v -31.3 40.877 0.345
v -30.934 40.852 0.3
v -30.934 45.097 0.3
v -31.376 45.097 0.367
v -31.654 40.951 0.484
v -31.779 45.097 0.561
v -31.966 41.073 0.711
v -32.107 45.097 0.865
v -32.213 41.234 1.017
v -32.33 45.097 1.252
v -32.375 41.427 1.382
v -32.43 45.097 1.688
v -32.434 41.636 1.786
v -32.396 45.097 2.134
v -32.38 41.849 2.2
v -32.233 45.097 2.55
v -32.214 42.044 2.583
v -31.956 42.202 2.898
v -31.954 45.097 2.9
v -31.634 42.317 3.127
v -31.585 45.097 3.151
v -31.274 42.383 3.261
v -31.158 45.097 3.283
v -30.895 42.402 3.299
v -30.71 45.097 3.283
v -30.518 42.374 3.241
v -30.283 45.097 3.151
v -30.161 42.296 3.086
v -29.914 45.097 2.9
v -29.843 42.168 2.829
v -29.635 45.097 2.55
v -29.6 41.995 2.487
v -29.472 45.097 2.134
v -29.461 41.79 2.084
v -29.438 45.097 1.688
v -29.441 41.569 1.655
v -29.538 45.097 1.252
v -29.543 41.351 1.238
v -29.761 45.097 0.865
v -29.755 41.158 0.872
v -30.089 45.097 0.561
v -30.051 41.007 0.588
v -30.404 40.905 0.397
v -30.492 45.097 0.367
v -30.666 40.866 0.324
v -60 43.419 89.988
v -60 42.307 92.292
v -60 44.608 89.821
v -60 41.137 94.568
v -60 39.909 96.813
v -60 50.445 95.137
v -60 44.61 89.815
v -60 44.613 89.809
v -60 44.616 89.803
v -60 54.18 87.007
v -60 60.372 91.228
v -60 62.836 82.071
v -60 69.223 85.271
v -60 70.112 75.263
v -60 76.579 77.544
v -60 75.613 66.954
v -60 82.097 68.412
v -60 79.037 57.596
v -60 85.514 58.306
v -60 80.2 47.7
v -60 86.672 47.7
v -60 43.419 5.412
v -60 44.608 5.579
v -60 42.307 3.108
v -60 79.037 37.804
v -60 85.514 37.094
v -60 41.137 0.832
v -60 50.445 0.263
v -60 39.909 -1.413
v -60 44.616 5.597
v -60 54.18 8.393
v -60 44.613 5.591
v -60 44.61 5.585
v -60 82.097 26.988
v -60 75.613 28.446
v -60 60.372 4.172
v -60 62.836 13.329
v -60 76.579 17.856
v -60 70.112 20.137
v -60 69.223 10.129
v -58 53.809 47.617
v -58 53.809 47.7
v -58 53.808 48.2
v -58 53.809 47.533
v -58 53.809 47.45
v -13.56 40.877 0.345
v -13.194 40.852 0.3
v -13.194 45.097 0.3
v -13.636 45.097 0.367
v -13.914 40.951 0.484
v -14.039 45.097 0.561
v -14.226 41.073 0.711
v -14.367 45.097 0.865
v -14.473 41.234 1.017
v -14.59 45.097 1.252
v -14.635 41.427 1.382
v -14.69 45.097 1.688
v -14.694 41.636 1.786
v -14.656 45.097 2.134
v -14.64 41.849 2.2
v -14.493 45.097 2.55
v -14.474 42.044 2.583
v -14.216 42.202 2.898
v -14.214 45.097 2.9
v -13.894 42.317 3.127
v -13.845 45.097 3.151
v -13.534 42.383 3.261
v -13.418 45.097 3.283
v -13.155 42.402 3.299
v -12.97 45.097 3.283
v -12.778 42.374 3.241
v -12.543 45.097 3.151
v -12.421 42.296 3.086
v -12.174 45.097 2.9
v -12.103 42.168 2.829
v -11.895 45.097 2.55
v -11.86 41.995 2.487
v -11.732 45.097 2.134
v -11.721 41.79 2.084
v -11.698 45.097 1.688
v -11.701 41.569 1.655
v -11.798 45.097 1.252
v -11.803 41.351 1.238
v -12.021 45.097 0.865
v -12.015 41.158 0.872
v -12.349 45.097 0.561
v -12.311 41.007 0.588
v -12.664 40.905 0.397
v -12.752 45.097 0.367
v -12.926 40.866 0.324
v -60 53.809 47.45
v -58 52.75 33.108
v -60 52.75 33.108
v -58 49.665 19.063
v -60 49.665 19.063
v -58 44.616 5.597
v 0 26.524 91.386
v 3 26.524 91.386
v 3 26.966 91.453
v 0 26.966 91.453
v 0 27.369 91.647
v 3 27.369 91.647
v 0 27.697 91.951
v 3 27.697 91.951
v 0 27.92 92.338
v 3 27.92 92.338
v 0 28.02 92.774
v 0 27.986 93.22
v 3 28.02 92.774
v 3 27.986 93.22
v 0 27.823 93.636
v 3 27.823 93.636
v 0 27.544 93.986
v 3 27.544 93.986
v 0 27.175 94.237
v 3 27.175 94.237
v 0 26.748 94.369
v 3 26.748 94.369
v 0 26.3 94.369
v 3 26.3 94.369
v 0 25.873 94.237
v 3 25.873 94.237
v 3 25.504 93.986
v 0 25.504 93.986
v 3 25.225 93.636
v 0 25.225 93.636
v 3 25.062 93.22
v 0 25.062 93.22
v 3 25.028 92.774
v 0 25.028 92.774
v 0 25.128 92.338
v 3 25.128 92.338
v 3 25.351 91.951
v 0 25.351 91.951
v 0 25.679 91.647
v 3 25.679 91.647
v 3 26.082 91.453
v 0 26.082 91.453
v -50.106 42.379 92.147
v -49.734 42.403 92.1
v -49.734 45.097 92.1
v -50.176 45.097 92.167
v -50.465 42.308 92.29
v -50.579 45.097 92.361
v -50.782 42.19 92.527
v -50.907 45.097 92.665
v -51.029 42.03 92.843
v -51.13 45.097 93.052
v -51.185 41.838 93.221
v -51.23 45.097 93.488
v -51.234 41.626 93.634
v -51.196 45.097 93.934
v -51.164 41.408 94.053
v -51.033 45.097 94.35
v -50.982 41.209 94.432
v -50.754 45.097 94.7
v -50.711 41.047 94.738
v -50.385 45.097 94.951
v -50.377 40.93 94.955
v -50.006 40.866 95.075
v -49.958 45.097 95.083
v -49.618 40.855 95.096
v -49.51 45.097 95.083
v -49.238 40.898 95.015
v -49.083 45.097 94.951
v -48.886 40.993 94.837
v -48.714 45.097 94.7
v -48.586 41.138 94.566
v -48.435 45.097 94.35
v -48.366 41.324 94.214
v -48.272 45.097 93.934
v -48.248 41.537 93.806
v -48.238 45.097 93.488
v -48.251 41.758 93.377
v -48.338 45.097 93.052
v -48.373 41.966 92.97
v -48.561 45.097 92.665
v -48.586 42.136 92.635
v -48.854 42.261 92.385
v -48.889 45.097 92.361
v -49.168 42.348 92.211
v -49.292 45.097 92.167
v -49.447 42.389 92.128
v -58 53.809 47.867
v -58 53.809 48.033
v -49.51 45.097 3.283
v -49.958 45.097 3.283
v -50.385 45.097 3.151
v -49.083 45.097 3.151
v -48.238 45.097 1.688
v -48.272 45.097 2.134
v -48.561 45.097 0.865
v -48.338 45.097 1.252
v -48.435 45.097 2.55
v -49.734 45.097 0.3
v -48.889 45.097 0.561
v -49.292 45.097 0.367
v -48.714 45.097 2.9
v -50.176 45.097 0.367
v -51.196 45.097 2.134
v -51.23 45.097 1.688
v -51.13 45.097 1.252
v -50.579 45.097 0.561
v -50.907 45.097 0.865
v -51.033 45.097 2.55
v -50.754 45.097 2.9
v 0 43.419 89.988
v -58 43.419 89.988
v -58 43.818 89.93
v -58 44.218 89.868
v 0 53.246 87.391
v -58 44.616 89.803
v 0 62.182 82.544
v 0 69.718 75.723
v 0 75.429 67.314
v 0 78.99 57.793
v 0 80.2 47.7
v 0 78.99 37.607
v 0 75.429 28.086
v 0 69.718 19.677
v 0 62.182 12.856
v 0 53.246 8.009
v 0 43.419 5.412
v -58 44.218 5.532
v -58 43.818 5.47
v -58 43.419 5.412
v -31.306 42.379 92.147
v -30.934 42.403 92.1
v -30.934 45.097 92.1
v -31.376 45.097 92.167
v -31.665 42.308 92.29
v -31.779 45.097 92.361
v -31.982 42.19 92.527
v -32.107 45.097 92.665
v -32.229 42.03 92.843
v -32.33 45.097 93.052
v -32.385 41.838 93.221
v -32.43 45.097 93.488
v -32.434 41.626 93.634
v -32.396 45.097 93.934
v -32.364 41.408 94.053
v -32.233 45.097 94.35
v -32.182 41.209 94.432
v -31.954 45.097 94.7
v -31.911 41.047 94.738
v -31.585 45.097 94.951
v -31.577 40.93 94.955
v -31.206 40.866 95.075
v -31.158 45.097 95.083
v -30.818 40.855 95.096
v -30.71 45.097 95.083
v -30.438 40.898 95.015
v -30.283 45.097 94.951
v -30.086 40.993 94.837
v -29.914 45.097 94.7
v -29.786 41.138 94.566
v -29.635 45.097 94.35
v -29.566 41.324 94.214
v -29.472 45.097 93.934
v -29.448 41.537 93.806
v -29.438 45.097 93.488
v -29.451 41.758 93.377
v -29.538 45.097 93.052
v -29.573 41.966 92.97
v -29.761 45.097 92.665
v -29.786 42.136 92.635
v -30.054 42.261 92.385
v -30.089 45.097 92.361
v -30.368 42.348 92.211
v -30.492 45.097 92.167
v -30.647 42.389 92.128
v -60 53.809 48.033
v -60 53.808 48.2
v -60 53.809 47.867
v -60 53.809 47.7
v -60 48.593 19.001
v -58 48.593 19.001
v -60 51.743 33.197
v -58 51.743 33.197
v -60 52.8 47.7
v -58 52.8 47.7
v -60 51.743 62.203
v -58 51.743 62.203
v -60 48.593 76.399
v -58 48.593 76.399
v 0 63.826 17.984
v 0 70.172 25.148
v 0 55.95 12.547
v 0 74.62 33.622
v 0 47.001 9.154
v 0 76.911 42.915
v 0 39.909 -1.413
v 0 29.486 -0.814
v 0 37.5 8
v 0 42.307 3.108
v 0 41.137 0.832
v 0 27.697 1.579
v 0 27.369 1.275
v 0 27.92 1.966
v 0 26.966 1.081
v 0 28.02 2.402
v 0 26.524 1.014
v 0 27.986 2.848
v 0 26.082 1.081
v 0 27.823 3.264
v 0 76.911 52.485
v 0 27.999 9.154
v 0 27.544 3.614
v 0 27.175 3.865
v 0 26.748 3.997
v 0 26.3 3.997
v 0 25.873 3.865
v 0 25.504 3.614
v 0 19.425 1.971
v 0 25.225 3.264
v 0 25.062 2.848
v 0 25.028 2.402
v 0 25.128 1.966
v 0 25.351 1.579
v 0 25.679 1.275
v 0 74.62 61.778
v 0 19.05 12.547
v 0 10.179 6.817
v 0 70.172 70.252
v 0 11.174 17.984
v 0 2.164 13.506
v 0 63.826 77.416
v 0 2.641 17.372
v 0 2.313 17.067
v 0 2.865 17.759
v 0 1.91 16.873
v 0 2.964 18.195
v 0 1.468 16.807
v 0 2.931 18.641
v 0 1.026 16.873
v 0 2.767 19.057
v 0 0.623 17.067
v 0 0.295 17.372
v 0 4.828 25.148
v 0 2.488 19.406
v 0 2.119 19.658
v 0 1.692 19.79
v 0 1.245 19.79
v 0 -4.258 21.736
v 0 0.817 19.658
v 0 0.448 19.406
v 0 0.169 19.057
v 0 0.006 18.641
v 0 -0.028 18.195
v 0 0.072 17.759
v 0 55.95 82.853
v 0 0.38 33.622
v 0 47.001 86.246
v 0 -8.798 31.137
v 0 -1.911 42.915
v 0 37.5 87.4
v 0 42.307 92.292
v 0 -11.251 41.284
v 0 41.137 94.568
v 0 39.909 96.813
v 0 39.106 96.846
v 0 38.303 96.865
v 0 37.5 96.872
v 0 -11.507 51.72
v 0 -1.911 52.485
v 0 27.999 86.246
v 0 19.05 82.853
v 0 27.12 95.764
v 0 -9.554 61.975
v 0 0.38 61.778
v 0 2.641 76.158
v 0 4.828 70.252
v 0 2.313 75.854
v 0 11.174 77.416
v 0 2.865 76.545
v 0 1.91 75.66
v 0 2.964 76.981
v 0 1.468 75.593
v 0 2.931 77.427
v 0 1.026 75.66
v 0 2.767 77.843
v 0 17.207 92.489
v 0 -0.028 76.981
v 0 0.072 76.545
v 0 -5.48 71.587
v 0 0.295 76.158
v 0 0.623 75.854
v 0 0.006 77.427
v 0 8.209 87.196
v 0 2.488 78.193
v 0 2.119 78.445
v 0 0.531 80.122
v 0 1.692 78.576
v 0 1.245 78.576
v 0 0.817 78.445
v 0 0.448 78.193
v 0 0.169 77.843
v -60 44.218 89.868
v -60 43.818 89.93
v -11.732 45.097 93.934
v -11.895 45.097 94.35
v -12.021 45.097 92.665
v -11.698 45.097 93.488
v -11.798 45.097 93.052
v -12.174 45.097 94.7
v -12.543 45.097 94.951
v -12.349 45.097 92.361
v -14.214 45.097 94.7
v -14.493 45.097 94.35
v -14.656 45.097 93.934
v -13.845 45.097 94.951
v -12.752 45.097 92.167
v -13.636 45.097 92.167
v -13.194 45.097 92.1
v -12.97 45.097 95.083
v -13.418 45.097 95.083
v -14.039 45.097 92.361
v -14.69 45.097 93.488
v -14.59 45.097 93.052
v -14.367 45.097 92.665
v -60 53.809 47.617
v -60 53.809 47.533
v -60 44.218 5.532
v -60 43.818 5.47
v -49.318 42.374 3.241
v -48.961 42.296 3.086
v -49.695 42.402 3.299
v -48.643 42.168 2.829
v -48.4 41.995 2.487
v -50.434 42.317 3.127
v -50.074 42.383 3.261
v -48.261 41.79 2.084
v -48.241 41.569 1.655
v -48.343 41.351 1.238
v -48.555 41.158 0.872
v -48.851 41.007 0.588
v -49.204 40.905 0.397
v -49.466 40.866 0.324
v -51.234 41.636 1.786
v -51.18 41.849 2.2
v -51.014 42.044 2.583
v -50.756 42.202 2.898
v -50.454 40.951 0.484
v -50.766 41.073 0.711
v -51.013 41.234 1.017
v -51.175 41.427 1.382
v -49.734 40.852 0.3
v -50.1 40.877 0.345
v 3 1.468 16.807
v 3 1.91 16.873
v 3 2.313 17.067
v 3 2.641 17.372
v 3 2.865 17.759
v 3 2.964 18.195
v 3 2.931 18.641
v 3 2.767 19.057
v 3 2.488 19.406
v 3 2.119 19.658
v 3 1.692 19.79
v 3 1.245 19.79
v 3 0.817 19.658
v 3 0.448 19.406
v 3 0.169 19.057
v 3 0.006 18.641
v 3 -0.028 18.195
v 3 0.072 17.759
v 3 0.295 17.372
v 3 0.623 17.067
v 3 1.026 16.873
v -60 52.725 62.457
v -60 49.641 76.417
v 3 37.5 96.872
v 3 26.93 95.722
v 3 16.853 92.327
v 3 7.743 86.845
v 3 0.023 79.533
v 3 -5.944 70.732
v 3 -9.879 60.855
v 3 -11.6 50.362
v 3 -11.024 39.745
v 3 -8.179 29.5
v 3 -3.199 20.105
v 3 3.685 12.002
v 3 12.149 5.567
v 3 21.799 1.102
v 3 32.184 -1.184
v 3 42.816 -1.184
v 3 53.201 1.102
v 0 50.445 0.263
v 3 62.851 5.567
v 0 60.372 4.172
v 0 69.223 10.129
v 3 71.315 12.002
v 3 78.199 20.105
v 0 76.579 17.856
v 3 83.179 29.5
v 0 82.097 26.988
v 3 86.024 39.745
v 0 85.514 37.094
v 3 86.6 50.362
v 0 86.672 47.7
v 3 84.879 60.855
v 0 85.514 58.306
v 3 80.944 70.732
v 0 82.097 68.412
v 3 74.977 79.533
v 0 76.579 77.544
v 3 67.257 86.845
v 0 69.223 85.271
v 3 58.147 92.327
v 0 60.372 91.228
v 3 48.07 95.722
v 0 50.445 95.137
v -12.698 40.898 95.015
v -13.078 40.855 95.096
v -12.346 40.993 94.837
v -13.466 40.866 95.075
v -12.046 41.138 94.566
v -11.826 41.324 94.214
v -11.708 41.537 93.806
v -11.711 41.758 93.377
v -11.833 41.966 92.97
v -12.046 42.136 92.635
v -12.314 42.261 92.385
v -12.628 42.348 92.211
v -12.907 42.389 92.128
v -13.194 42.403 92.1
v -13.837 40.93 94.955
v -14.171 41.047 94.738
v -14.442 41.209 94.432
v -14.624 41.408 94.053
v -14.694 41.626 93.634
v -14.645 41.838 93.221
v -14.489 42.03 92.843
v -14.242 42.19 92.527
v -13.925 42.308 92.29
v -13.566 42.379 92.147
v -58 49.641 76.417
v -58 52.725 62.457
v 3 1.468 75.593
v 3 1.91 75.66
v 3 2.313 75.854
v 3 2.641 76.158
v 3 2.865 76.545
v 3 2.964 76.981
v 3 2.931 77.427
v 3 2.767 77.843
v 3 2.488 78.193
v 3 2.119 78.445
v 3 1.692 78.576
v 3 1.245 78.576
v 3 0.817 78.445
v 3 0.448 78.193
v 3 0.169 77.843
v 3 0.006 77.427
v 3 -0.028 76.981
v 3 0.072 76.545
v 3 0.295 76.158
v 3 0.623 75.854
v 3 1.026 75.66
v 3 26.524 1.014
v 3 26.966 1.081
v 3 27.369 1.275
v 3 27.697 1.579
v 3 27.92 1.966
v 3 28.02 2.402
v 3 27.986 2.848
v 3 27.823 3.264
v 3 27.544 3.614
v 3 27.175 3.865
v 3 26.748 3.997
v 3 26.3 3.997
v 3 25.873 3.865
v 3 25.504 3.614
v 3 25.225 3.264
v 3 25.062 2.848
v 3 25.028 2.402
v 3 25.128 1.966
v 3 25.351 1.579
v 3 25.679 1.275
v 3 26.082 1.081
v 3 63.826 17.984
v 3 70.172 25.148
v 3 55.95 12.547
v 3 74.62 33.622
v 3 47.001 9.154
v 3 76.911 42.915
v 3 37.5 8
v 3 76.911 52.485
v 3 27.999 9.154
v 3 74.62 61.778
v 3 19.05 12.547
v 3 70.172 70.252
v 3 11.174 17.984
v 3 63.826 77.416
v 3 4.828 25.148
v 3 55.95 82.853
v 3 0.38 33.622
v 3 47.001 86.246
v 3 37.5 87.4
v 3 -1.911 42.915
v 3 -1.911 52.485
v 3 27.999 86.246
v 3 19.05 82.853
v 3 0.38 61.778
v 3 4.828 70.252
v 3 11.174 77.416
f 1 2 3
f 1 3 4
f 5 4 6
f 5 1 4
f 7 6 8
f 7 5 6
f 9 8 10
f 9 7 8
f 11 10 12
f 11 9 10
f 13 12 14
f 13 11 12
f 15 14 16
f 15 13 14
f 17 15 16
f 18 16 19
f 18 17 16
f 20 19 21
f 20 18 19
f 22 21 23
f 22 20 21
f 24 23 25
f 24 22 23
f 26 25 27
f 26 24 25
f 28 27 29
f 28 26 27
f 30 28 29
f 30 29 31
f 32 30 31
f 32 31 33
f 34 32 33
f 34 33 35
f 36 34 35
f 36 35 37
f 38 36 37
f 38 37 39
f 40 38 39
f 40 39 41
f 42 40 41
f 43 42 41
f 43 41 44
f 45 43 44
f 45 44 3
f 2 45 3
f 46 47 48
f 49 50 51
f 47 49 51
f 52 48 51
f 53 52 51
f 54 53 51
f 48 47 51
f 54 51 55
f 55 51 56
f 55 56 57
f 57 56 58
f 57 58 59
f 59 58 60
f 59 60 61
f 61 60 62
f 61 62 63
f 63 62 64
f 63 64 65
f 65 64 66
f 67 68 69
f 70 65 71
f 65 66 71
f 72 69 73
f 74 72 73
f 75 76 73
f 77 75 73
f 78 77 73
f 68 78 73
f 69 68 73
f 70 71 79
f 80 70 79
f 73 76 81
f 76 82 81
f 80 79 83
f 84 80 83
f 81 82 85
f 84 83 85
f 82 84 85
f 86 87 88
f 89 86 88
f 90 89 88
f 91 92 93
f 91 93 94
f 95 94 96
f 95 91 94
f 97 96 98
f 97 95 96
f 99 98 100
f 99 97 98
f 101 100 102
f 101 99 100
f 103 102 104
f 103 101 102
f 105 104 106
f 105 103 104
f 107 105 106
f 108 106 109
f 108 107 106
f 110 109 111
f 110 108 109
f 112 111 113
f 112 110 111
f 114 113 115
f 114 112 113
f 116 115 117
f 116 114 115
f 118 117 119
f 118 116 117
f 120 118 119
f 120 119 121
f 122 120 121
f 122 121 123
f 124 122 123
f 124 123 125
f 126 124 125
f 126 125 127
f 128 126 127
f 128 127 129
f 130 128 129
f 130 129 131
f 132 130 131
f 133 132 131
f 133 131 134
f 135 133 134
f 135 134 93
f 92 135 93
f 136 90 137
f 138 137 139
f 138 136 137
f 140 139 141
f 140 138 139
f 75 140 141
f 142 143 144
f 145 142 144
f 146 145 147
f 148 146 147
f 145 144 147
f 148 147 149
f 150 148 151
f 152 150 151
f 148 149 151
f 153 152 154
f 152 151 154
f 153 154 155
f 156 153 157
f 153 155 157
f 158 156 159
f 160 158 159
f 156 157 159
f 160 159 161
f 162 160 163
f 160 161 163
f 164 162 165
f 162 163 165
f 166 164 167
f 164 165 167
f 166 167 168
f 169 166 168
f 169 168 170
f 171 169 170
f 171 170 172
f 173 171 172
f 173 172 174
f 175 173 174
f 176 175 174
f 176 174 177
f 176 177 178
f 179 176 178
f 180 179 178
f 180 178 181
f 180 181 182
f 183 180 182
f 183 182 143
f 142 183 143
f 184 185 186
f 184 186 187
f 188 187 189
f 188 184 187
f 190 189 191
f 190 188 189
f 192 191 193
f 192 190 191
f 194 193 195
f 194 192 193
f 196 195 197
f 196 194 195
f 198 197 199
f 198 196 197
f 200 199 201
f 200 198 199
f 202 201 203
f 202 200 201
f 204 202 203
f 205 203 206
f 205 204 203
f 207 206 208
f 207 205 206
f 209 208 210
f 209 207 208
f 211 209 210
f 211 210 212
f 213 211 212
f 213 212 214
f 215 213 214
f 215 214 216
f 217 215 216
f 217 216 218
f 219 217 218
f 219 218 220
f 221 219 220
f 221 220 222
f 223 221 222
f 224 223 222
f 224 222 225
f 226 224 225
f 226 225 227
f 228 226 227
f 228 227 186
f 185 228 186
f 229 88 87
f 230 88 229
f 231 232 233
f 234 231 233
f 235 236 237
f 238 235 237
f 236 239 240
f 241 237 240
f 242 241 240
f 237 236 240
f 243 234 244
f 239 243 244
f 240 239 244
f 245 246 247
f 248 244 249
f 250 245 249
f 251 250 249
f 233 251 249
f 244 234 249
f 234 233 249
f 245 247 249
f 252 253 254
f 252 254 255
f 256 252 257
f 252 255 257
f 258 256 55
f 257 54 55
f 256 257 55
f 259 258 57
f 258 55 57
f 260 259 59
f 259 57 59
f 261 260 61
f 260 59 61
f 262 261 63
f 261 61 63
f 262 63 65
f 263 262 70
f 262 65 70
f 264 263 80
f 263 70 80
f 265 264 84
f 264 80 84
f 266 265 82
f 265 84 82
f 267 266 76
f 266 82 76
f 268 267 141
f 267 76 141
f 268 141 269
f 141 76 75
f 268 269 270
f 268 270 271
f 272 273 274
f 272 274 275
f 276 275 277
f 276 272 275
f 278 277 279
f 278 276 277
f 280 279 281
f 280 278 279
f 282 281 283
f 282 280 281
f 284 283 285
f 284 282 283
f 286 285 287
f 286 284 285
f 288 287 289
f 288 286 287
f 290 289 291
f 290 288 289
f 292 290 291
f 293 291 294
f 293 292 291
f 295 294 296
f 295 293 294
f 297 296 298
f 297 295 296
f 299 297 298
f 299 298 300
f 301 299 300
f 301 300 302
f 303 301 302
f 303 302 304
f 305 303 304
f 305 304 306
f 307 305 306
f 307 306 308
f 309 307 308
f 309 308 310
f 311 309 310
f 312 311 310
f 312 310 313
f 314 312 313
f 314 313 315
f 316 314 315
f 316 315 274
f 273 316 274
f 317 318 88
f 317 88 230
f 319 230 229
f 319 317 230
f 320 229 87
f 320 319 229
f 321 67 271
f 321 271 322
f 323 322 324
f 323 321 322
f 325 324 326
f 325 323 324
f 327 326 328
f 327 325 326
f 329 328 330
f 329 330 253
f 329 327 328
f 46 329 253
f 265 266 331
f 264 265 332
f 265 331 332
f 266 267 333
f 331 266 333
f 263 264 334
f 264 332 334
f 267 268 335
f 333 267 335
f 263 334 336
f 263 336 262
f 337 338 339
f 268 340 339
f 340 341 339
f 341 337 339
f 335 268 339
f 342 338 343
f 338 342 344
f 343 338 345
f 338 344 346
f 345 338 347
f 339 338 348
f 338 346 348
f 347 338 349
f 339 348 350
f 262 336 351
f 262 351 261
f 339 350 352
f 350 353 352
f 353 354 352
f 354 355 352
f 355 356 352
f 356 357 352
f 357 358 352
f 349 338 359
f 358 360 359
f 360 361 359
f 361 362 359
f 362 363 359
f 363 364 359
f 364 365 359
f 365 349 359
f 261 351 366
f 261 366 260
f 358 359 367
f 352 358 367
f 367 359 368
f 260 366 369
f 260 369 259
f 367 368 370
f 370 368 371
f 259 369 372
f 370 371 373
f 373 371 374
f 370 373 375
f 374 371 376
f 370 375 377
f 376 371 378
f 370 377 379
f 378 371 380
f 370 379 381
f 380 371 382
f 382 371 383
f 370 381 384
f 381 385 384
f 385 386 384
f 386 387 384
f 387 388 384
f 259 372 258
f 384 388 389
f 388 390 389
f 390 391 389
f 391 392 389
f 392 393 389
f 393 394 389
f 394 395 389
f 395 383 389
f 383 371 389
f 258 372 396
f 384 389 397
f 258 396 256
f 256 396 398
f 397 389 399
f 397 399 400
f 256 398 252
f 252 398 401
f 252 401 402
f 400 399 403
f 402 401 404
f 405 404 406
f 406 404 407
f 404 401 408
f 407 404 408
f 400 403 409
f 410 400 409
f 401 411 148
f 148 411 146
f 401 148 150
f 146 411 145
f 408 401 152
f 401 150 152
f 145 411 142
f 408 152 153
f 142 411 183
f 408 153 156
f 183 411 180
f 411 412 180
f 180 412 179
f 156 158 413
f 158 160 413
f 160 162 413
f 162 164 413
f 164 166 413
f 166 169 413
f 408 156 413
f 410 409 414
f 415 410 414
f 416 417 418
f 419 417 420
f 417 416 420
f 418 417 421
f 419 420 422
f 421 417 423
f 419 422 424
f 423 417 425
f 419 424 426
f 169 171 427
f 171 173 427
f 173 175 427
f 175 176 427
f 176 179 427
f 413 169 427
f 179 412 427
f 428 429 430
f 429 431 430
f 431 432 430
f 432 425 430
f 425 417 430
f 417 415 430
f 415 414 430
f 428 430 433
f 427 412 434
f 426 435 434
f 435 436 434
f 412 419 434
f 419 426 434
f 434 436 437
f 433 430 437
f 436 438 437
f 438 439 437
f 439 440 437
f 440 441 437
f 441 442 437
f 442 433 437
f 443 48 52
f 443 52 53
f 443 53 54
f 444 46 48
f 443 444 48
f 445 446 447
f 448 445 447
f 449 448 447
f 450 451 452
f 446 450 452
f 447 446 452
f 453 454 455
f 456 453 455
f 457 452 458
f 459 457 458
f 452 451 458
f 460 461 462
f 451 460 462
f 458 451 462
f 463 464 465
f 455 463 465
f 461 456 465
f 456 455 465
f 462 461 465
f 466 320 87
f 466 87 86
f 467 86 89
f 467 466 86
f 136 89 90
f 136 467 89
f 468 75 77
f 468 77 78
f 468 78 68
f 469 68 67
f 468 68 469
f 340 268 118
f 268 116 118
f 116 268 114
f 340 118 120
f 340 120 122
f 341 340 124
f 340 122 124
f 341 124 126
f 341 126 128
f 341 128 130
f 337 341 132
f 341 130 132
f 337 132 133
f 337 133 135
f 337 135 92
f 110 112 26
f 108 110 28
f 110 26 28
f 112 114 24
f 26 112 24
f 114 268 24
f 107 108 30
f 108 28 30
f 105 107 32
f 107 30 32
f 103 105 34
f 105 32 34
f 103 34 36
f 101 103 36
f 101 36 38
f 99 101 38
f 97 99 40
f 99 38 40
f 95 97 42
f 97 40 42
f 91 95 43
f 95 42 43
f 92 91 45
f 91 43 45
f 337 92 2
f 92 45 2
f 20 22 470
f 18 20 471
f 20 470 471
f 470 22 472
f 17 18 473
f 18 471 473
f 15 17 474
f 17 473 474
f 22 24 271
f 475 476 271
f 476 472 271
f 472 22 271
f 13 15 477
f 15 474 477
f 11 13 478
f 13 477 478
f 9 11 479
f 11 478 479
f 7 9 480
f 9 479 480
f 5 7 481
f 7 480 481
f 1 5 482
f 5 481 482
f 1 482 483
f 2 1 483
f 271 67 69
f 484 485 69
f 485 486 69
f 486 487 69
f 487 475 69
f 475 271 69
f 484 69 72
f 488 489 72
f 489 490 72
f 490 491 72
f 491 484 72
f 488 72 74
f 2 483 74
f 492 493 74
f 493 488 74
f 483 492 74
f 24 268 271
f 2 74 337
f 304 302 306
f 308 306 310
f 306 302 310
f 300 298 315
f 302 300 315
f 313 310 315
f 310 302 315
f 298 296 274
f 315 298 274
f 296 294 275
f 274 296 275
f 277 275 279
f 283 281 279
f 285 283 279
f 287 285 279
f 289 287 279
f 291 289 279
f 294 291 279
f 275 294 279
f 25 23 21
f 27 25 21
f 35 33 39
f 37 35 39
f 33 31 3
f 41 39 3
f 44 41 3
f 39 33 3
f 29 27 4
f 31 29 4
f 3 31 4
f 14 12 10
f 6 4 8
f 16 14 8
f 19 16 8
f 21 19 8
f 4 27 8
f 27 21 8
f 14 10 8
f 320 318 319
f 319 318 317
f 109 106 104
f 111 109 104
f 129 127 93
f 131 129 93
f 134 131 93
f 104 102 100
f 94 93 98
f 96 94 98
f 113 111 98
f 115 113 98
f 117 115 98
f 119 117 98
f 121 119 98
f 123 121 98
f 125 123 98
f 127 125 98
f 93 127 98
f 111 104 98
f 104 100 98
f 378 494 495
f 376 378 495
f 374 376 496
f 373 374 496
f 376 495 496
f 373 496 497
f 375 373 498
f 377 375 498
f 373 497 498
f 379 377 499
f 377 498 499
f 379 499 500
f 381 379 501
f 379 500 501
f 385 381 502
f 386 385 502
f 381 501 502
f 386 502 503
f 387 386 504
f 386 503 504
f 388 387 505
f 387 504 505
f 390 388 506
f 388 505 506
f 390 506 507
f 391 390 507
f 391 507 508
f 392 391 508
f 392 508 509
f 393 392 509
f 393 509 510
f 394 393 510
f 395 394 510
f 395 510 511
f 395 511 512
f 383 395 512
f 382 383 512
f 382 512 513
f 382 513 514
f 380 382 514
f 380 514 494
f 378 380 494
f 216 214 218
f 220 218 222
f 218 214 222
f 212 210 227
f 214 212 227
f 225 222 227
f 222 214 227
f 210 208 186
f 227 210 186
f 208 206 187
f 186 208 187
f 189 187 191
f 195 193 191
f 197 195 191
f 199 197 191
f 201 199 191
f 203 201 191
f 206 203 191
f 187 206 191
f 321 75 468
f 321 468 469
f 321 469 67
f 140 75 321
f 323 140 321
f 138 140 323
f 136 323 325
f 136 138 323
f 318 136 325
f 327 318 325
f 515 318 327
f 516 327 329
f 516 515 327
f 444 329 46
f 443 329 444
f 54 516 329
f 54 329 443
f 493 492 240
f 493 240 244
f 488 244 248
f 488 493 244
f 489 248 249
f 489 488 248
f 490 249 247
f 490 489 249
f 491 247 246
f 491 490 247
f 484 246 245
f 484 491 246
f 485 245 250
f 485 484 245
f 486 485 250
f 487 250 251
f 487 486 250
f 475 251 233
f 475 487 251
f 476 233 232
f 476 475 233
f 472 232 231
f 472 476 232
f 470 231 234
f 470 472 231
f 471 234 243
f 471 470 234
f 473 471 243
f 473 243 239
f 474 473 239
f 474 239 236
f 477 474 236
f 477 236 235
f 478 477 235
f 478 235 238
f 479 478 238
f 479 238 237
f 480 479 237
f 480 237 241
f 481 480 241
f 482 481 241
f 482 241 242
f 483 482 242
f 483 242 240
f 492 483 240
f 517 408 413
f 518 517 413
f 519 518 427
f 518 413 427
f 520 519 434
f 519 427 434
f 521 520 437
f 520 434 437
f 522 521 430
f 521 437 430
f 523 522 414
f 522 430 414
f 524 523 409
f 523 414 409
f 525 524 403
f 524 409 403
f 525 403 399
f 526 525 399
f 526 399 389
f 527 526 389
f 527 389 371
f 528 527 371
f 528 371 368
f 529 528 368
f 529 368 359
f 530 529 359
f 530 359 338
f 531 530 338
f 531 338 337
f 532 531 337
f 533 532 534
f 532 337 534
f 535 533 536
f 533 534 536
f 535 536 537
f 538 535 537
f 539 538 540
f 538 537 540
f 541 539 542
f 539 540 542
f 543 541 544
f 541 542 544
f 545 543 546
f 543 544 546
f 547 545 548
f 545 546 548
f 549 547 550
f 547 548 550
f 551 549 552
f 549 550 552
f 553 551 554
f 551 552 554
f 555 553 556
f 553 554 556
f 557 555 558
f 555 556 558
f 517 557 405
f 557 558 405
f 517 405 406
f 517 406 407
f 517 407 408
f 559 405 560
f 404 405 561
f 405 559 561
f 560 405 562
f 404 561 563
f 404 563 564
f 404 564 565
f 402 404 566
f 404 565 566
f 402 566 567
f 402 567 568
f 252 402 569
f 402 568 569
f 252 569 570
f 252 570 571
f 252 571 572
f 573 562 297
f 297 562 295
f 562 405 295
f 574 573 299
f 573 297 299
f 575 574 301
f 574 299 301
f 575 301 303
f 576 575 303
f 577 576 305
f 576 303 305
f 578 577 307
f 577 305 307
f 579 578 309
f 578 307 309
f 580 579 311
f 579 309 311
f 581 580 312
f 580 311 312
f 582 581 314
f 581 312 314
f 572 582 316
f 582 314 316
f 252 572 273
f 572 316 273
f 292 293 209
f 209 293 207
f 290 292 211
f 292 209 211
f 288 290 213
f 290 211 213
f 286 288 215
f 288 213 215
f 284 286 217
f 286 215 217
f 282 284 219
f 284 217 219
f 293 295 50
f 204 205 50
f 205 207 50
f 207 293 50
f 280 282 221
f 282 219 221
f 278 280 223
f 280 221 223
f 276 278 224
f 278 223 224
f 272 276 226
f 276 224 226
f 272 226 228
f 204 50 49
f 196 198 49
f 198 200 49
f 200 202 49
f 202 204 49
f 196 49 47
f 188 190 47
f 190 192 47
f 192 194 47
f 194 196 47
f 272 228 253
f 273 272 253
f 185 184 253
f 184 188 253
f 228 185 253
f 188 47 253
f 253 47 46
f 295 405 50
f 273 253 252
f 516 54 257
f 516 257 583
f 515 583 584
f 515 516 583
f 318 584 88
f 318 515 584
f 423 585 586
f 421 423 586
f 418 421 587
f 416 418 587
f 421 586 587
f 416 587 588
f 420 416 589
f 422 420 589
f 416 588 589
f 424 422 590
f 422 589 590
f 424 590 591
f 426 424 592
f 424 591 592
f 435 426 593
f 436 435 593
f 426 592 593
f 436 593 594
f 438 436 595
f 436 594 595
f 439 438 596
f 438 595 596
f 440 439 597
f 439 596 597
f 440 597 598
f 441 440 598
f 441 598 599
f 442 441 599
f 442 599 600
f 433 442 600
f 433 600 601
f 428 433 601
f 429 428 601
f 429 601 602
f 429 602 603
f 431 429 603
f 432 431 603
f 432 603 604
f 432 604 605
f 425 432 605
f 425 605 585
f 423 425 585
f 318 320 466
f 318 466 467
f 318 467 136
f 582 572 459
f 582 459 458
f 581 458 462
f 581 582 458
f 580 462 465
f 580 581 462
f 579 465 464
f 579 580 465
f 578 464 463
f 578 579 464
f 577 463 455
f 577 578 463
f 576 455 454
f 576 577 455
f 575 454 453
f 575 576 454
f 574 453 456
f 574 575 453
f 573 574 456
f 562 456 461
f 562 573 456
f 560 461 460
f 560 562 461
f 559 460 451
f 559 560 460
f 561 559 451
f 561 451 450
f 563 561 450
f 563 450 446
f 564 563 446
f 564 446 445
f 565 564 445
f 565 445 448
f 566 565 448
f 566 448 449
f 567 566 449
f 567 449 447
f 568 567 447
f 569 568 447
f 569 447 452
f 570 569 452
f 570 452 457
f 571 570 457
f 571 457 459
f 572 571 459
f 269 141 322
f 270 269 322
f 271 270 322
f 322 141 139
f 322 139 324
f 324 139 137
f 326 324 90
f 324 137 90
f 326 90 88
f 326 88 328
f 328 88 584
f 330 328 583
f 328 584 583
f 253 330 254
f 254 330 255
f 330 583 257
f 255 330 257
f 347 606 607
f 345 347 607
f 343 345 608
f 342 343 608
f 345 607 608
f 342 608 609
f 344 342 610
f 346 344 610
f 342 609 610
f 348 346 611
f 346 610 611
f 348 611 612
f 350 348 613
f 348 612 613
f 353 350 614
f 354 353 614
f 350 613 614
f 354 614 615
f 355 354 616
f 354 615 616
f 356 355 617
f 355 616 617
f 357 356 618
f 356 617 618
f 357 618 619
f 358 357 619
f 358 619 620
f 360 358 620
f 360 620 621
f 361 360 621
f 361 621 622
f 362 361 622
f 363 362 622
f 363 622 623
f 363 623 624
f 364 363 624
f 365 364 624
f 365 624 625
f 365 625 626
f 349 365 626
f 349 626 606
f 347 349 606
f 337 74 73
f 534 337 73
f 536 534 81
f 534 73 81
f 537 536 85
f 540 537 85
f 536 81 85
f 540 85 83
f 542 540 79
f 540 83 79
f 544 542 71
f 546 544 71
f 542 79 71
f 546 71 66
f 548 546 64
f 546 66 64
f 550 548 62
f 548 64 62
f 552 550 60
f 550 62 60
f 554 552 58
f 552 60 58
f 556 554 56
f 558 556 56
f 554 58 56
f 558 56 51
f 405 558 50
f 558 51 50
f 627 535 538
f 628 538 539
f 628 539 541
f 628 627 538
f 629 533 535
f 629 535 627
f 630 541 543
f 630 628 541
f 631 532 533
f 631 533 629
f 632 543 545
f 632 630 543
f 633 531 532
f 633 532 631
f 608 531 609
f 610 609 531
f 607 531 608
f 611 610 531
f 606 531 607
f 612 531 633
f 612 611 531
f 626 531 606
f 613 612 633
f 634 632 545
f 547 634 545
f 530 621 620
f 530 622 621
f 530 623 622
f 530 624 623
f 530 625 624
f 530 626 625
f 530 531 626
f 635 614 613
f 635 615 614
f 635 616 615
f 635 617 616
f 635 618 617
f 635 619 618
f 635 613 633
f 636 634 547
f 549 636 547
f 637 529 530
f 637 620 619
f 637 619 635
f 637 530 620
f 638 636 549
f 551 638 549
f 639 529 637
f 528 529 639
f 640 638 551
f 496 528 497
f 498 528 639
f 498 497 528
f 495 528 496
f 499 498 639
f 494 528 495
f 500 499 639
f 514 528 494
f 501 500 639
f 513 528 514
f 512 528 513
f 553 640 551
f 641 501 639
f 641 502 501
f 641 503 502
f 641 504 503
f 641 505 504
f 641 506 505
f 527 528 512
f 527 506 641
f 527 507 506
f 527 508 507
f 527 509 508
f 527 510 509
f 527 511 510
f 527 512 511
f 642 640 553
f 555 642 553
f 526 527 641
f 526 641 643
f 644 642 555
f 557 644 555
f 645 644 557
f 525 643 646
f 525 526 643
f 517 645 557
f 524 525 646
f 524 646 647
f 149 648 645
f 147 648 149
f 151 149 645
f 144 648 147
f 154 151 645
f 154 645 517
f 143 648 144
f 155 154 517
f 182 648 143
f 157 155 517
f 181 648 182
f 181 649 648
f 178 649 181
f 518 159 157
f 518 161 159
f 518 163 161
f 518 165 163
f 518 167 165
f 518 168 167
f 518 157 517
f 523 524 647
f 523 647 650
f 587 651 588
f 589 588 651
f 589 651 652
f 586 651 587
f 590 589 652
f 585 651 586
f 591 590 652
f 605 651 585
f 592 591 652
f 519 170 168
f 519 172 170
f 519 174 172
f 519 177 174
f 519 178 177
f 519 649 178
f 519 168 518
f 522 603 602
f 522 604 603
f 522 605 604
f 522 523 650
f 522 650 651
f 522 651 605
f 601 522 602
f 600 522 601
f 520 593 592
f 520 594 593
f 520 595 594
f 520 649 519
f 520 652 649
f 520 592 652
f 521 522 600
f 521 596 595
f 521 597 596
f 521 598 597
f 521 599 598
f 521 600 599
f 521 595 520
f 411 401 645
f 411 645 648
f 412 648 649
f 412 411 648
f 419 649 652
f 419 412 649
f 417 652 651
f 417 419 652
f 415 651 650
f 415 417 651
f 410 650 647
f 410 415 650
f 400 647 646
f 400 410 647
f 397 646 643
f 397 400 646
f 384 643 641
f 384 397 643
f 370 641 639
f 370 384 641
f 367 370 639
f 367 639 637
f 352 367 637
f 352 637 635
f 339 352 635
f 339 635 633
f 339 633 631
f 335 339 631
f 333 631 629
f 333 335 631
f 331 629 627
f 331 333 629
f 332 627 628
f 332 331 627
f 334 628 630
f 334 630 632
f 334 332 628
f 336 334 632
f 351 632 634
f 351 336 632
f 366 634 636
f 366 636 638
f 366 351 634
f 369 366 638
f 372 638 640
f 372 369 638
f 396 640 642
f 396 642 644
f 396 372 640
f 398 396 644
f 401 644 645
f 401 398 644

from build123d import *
from build123d.topology import SkipClean

# Parameters (mm, degrees)
SKETCH_1_R      = 49.171750004
SKETCH_1_R_2    = 39.7
EXTRUDE_1_DEPTH = 3
EXTRUDE_START   = 60
EXTRUDE_2_DEPTH = 60
SKETCH_3_R      = 1.5
EXTRUDE_4_DEPTH = 60
EXTRUDE_5_DEPTH = 2
SKETCH_5_R      = 1.5
EXTRUDE_6_DEPTH = 10


with BuildPart() as part:
    # Эскиз1 → Выдавливание1 (new body)
    with BuildSketch(Plane.YZ):
        with Locations(Location((37.5, 47.7, 0), (0, 0, 90))):
            Circle(SKETCH_1_R)
        with Locations(Location((37.5, 47.7, 0), (0, 0, 90))):
            Circle(SKETCH_1_R_2, mode=Mode.SUBTRACT)
    extrude(amount=EXTRUDE_1_DEPTH)

    # Эскиз2 → Выдавливание2 (add)
    with BuildSketch(Plane(origin=(0, 37.5, 47.7), x_dir=(0, 0, 1), z_dir=(-1, 0, 0)).offset(EXTRUDE_START)):
        with BuildLine():
            ThreePointArc((-42.287817796, 5.918654073), (-45.733949258, 4.2292184), (-49.112714544, 2.408789856))
            ThreePointArc((-49.112714544, 2.408789856), (0, 49.171750004), (49.112714544, 2.408789856))
            ThreePointArc((49.112714544, 2.408789856), (45.733949258, 4.2292184), (42.287817796, 5.918654073))
            ThreePointArc((42.287817796, 5.918654073), (0, 42.7), (-42.287817796, 5.918654073))
        make_face()
    extrude(amount=-EXTRUDE_2_DEPTH)

    # Эскиз3 → Выдавливание4 (cut)
    with BuildSketch(Plane(origin=(3, 37.5, 47.7), x_dir=(0, 0, -1), z_dir=(1, 0, 0))):
        with Locations((45.186031447, -10.975999366)):
            Circle(SKETCH_3_R)
        with Locations((29.39321752, -36.031774364)):
            Circle(SKETCH_3_R)
        with Locations((-29.39321752, -36.031774364)):
            Circle(SKETCH_3_R)
        with Locations((-45.186031447, -10.975999366)):
            Circle(SKETCH_3_R)
    extrude(amount=-EXTRUDE_4_DEPTH, mode=Mode.SUBTRACT)

    # Эскиз4 → Выдавливание5 (add)
    with SkipClean():  # the faces are left unmerged after this step: merging them gives an invalid solid
        with BuildSketch(Plane(origin=(-60, 37.5, 47.7), x_dir=(0, 0, 1), z_dir=(-1, 0, 0))):
            with BuildLine():
                Line((-0.24997743, 16.30888643), (0.499998469, 16.307958241))
                Line((0.499998469, 16.307958241), (0, 16.309195752))
                ThreePointArc((0, 16.309195752), (-0.124988811, 16.309118421), (-0.24997743, 16.30888643))
            make_face()
            with BuildLine():
                ThreePointArc((-42.287817796, 5.918654073), (0, 15.3), (42.287817796, 5.918654073))
                Line((42.287817796, 5.918654073), (42.121404236, 7.107651815))
                ThreePointArc((42.121404236, 7.107651815), (21.801545856, 13.928343922), (0.499998469, 16.307958241))
                Line((0.499998469, 16.307958241), (-0.24997743, 16.30888643))
                ThreePointArc((-0.24997743, 16.30888643), (-21.679464377, 13.955250498), (-42.121404236, 7.107651815))
                Line((-42.121404236, 7.107651815), (-42.287817796, 5.918654073))
            make_face()
            with BuildLine():
                Line((0, 16.309195752), (0.499998469, 16.307958241))
                ThreePointArc((0.499998469, 16.307958241), (0.25, 16.308886374), (0, 16.309195752))
            make_face()
        extrude(amount=-EXTRUDE_5_DEPTH)

    # Эскиз5 → Резьба6 (cut)
    with SkipClean():  # the faces are left unmerged after this step: merging them gives an invalid solid
        with BuildSketch(Plane(origin=(1.5, 35.097404478, 62.473935176), x_dir=(0, 0, -1), z_dir=(0, 1, 0))):
            with Locations((-31.126064824, 51.234)):
                Circle(SKETCH_5_R)
            with Locations((-31.126064824, 32.434)):
                Circle(SKETCH_5_R)
            with Locations((-31.126064824, 14.694)):
                Circle(SKETCH_5_R)
            with Locations((60.673935176, 51.234)):
                Circle(SKETCH_5_R)
            with Locations((60.673935176, 32.434)):
                Circle(SKETCH_5_R)
            with Locations((60.673935176, 14.694)):
                Circle(SKETCH_5_R)
        extrude(amount=EXTRUDE_6_DEPTH, mode=Mode.SUBTRACT)


solid = part.part
